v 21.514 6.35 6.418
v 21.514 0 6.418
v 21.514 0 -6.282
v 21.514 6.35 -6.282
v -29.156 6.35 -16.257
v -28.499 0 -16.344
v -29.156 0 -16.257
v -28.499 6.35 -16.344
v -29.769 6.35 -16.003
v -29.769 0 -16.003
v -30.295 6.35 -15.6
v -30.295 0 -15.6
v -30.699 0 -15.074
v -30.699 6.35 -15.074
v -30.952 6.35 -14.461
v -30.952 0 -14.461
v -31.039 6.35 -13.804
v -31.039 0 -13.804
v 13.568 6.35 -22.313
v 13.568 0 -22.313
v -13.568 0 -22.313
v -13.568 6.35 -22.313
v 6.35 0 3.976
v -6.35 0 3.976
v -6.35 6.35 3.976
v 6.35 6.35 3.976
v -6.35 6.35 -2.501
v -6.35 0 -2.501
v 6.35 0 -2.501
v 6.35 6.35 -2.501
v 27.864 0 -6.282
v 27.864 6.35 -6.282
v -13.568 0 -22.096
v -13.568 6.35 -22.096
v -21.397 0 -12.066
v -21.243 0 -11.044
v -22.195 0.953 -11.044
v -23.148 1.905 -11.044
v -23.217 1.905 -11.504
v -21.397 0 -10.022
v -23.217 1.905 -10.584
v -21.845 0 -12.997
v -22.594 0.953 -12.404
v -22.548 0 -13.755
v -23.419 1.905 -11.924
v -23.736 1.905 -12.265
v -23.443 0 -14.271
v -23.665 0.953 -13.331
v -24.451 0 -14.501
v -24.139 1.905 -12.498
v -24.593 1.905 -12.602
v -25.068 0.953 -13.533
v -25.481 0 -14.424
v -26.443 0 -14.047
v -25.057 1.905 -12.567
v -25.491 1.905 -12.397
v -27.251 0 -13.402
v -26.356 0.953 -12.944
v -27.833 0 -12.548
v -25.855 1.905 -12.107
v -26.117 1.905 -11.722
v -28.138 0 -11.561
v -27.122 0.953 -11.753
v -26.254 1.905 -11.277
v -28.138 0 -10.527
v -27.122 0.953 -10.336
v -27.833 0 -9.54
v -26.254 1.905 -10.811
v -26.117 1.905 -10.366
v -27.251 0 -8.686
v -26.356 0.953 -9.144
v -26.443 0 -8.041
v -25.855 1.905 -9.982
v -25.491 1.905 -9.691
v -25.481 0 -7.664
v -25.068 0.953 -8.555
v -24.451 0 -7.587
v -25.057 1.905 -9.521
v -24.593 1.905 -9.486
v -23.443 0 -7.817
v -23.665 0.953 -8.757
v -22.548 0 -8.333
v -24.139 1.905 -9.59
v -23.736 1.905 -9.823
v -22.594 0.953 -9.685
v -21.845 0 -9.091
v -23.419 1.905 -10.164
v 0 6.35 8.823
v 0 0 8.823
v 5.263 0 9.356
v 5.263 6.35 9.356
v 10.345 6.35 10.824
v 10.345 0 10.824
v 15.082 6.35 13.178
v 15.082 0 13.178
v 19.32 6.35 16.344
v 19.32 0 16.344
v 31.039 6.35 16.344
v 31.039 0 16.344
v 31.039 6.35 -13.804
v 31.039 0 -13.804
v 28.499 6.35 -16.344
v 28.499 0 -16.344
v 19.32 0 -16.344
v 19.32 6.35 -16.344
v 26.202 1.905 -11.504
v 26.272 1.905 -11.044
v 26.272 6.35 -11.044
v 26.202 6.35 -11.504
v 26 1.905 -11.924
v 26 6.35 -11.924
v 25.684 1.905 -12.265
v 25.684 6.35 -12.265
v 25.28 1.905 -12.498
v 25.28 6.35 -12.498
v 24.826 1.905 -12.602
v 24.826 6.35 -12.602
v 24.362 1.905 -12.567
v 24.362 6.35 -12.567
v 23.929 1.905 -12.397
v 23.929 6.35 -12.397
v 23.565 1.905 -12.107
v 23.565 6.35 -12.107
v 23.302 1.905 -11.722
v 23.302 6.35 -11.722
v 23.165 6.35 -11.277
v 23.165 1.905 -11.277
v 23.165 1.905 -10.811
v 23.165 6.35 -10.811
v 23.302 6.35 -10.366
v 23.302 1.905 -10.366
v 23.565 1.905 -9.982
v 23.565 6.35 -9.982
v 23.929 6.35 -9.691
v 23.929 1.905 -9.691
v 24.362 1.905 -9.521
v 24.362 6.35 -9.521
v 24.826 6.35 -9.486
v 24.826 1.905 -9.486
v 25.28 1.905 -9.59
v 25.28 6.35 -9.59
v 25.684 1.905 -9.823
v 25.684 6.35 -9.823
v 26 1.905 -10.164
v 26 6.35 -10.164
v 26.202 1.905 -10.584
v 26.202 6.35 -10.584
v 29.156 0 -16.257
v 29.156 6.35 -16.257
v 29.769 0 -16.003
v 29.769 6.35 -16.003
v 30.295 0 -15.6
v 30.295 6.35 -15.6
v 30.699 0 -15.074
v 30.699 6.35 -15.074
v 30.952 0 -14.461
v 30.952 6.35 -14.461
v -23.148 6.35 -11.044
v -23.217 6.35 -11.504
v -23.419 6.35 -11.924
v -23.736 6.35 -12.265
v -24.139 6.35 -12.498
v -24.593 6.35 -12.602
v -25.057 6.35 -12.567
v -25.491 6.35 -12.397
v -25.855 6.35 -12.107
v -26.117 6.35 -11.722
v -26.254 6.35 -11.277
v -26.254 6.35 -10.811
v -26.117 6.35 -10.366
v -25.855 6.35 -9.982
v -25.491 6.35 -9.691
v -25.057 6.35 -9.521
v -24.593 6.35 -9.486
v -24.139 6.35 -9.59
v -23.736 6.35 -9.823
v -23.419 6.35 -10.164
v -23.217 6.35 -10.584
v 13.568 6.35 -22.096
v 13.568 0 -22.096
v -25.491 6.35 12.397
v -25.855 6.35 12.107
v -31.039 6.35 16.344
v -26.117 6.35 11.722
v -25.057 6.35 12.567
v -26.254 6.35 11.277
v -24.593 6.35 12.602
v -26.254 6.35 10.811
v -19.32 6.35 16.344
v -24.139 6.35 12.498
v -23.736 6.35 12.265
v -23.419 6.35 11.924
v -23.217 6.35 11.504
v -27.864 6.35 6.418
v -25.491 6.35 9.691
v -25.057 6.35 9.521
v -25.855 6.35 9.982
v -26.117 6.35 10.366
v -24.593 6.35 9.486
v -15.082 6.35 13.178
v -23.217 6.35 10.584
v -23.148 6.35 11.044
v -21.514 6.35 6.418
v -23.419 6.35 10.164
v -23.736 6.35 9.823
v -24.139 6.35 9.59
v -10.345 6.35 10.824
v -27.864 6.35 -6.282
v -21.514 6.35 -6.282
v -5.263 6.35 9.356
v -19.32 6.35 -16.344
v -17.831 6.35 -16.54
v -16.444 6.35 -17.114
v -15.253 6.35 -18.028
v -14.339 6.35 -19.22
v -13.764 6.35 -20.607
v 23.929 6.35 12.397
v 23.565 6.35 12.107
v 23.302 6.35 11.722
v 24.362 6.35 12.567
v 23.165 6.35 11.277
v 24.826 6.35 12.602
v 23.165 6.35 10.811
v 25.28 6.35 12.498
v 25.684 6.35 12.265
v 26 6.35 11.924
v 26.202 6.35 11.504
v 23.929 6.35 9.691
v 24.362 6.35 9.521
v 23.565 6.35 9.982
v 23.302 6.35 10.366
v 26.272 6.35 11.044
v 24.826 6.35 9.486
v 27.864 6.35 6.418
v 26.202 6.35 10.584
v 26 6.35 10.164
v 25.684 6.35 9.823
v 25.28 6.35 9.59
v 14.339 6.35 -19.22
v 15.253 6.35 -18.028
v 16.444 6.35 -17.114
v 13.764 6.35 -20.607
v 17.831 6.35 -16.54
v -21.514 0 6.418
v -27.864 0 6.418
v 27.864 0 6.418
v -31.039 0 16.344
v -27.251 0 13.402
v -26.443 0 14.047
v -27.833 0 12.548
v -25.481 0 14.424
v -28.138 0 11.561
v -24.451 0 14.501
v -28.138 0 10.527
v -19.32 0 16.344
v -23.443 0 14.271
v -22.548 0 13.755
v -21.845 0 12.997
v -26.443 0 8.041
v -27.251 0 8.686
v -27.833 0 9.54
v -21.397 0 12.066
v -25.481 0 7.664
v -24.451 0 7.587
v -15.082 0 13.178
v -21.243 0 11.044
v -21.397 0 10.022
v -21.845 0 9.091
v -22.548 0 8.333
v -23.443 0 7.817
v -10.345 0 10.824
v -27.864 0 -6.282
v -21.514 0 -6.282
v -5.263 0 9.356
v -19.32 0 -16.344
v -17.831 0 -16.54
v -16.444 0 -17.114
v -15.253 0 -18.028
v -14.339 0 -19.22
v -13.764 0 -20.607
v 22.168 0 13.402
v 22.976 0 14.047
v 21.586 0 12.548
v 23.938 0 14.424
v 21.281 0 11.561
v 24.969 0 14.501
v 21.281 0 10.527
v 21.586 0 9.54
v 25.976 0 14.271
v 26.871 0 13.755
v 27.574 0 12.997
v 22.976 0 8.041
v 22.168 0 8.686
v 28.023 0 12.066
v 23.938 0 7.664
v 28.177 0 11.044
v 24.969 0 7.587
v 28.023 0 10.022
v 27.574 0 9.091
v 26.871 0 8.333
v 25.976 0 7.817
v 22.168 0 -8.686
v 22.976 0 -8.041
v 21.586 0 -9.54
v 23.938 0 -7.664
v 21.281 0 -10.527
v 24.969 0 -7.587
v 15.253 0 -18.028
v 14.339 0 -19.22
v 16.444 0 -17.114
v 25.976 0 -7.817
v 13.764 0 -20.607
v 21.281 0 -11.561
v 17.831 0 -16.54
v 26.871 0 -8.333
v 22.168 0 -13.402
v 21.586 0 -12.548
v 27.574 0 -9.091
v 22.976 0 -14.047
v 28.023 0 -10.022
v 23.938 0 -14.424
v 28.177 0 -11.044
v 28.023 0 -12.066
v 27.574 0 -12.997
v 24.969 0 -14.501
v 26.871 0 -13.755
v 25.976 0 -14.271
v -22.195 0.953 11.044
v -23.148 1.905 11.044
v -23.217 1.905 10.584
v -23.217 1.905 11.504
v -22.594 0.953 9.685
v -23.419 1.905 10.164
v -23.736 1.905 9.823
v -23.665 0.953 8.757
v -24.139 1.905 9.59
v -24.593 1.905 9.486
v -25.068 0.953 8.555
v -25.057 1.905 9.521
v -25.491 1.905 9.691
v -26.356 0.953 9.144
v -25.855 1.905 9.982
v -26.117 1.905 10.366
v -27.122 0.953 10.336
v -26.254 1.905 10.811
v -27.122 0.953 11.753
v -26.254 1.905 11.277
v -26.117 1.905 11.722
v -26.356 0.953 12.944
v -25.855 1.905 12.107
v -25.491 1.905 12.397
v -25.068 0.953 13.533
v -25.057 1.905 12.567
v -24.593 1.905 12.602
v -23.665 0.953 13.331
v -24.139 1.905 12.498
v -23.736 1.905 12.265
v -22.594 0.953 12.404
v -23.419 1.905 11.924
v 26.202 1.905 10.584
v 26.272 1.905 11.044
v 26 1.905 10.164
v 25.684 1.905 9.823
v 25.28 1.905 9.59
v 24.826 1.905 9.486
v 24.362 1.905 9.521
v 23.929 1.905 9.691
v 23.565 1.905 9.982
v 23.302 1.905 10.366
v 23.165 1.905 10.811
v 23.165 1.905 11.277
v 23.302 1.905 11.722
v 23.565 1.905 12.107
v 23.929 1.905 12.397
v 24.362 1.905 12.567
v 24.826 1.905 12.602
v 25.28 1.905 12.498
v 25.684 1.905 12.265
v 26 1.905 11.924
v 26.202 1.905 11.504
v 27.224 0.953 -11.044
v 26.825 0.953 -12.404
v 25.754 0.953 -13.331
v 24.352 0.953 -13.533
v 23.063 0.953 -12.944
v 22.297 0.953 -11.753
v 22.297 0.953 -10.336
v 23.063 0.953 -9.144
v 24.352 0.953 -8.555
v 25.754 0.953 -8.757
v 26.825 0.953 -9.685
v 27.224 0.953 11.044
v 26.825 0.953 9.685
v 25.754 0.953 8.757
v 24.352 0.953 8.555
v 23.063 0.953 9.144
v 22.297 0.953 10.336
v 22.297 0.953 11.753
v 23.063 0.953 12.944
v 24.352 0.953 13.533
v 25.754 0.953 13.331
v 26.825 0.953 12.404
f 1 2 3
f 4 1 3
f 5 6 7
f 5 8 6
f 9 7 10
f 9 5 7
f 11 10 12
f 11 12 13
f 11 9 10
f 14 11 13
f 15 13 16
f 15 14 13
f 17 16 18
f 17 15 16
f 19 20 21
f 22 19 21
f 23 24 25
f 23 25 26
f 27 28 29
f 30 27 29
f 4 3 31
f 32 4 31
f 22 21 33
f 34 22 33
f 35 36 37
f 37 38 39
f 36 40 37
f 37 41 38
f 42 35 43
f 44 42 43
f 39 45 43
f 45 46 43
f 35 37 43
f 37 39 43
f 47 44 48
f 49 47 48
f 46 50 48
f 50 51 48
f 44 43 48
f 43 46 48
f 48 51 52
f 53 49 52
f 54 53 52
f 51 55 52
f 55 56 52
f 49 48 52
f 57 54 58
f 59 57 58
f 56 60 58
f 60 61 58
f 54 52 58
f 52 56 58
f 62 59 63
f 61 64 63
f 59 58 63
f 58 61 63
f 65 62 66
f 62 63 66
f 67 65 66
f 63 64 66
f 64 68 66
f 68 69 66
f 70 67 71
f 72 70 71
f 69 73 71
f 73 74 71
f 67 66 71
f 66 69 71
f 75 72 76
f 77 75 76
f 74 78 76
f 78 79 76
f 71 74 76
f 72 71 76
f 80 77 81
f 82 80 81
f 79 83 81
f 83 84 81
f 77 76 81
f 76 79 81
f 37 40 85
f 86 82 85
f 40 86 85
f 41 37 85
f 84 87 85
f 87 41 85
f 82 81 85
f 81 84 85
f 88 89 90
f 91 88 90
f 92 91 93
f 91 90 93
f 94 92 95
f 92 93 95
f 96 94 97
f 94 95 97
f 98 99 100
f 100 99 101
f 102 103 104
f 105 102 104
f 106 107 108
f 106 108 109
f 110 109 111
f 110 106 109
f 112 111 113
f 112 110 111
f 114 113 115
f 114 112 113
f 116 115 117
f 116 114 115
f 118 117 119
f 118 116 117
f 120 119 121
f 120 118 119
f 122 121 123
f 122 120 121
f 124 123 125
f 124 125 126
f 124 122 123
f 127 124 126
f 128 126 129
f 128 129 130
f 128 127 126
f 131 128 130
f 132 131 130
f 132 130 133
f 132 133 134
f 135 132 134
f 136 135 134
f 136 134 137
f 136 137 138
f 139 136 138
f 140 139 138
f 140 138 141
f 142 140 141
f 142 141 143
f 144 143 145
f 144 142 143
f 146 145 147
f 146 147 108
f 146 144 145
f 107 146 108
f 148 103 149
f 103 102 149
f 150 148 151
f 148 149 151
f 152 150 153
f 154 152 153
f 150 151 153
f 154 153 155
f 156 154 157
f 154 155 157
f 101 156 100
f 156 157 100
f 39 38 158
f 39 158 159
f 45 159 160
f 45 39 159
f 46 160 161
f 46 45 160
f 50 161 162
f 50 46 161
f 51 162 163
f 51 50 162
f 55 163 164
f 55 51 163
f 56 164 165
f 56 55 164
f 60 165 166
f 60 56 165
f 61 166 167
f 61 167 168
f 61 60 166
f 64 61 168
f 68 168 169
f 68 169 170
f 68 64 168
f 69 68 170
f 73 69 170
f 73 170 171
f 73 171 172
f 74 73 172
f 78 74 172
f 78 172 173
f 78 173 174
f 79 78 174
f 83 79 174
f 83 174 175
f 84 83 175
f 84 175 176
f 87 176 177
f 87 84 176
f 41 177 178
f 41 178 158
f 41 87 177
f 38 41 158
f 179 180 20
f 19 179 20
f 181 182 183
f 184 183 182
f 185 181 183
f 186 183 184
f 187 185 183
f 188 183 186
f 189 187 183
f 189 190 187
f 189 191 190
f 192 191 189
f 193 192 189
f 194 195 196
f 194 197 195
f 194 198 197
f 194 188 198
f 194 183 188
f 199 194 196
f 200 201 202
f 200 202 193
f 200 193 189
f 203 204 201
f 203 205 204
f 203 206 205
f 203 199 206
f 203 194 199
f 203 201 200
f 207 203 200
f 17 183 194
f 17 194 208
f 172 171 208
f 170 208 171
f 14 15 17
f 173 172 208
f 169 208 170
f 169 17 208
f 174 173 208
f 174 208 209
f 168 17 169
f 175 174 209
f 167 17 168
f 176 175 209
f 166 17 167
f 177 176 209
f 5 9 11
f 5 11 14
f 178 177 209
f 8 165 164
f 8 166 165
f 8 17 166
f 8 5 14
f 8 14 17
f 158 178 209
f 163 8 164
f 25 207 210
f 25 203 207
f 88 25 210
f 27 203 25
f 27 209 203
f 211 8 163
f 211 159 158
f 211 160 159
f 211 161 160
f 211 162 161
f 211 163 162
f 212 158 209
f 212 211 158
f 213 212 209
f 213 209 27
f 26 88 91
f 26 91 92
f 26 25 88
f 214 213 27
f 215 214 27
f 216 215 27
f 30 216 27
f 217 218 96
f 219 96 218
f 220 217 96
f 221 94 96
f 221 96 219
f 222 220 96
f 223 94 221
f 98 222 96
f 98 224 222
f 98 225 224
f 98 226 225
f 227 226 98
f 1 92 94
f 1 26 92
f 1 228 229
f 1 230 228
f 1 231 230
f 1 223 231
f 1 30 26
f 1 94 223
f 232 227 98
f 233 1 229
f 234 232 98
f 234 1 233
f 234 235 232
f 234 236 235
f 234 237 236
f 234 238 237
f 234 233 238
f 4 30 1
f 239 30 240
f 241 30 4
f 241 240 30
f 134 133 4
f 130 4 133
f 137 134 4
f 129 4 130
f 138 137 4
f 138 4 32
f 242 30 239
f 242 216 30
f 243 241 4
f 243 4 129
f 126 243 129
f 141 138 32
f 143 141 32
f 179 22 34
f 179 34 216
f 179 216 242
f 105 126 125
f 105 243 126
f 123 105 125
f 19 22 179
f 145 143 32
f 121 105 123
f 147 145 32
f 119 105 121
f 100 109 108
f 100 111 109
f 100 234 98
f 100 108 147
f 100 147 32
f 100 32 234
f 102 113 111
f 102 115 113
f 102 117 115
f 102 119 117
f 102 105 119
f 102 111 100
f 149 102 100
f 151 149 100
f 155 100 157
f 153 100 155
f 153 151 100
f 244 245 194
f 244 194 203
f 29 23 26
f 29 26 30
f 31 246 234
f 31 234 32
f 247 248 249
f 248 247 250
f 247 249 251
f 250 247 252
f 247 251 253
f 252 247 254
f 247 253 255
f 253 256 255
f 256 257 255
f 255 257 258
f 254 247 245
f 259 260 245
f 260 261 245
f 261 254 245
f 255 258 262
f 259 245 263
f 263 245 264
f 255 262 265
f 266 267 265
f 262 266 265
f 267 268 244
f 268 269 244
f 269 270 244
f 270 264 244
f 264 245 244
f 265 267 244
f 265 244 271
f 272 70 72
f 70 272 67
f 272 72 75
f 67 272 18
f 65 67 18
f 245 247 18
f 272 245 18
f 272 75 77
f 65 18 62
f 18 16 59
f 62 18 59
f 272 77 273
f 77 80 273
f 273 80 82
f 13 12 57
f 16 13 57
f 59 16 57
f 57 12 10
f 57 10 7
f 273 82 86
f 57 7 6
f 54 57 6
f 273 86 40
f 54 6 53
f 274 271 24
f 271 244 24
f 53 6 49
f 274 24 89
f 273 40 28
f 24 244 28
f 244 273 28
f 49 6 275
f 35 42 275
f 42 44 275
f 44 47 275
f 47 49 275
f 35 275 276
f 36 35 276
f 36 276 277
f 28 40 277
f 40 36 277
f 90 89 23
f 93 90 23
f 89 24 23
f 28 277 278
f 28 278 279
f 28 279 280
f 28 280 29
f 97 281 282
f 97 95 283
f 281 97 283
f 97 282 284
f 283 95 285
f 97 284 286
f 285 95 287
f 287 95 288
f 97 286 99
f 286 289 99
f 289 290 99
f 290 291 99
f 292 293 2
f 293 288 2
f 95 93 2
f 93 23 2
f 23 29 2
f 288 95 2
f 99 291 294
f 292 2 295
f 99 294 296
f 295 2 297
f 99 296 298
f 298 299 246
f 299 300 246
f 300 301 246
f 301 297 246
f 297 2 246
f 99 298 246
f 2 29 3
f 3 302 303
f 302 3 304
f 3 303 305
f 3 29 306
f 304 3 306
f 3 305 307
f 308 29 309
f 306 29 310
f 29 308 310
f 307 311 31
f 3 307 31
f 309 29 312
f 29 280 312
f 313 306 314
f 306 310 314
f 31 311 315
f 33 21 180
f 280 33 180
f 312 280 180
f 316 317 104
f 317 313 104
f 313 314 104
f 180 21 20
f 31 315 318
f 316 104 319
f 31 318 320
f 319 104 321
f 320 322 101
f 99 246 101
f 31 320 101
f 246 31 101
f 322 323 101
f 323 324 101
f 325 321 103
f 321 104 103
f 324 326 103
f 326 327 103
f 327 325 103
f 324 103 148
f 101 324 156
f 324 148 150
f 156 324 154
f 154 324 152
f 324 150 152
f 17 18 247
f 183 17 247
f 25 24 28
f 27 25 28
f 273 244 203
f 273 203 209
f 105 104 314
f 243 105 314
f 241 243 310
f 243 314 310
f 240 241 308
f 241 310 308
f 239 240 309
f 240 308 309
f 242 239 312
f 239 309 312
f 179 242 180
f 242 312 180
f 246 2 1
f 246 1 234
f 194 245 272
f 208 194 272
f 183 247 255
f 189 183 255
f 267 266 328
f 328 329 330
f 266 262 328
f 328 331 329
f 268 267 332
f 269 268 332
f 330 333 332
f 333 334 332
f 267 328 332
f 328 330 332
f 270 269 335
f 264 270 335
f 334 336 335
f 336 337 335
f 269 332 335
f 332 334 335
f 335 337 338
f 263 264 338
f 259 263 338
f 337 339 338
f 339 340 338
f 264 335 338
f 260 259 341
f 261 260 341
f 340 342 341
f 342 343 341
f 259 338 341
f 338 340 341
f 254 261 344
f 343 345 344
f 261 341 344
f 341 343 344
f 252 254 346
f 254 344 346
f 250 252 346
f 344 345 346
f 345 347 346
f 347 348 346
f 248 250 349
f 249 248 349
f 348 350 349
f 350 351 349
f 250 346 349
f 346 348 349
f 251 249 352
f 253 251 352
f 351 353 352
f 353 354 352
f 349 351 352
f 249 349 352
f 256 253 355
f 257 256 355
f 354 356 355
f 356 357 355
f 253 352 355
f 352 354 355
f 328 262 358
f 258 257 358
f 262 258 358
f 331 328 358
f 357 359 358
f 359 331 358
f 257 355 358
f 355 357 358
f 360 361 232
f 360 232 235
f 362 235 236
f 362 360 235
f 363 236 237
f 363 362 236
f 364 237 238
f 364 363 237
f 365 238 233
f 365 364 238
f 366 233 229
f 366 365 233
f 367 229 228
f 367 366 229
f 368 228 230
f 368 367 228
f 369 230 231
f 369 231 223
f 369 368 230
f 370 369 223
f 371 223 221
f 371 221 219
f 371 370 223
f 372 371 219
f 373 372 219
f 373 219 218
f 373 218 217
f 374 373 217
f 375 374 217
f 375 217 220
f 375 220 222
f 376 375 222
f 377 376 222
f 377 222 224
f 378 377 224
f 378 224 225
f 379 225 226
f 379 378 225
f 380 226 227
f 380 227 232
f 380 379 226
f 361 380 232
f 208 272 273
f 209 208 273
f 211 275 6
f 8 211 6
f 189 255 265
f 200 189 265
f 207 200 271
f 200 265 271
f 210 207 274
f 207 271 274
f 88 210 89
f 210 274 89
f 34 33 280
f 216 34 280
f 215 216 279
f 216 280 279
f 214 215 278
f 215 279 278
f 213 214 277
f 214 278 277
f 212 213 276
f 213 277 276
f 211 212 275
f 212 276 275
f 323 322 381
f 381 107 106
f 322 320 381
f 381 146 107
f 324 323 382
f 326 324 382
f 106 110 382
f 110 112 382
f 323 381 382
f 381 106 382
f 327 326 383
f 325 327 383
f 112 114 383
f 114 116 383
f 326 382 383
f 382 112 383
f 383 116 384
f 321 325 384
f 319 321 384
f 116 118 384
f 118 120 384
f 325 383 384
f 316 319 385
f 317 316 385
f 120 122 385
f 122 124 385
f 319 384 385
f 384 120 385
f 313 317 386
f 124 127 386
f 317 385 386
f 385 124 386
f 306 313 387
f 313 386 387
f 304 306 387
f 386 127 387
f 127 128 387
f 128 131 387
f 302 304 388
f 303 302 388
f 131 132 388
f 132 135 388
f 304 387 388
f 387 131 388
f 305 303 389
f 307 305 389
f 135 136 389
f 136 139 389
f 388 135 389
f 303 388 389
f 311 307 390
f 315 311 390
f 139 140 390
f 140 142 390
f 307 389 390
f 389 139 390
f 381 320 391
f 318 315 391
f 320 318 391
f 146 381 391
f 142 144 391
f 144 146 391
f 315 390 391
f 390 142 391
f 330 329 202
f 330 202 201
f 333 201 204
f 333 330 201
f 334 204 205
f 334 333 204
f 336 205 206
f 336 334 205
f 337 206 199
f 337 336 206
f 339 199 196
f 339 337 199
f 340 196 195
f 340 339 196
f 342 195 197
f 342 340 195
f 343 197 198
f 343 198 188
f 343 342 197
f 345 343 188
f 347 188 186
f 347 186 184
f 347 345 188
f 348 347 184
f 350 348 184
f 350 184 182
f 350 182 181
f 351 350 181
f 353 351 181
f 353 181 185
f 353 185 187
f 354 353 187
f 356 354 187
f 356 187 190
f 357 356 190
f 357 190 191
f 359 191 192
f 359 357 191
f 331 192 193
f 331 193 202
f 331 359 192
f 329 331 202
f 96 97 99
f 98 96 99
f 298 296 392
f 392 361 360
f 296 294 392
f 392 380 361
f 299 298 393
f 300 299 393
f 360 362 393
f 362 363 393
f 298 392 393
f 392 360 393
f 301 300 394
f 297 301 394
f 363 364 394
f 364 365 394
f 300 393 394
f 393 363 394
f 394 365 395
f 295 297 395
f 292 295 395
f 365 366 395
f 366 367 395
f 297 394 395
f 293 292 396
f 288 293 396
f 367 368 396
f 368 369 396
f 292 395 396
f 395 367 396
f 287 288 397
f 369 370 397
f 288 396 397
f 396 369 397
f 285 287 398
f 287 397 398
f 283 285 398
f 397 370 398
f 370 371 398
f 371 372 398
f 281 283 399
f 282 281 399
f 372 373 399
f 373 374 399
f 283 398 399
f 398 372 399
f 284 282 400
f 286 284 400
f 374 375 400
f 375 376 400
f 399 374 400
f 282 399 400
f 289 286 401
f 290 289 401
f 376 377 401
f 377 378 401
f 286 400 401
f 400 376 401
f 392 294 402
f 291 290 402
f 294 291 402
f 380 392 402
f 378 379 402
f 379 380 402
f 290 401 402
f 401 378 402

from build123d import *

# Parameters (mm, degrees)
SKETCH1_R           = 1.5621
SKETCH1_W           = 6.35
SKETCH1_H           = 12.7
SKETCH1_W_2         = 12.7
SKETCH1_H_2         = 6.477
BOSS_EXTRUDE1_DEPTH = 6.35
FILLET1_R           = 2.54
CHAMFER1_SIZE       = 1.905


with BuildPart() as part:
    # Sketch1 → Boss-Extrude1 (new body)
    with BuildSketch(Plane(origin=(0, 0, 0), x_dir=(1, 0, 0), z_dir=(0, 1, 0))):
        with BuildLine():
            Line((13.568067648, 22.312647987), (-13.568067648, 22.312647987))
            Line((-13.568067648, 22.312647987), (-13.568067648, 22.095526842))
            ThreePointArc((-13.568067648, 22.095526842), (-15.25275396, 18.028334299), (-19.319946504, 16.343647987))
            Line((-19.319946504, 16.343647987), (-31.0388, 16.343647987))
            Line((-31.0388, 16.343647987), (-31.0388, -16.343647987))
            Line((-31.0388, -16.343647987), (-29.684698321, -16.343647987))
            Line((-29.684698321, -16.343647987), (-19.319946504, -16.343647987))
            ThreePointArc((-19.319946504, -16.343647987), (-10.344922534, -10.823696712), (0, -8.822823132))
            ThreePointArc((0, -8.822823132), (10.344922534, -10.823696712), (19.319946504, -16.343647987))
            Line((19.319946504, -16.343647987), (29.684698321, -16.343647987))
            Line((29.684698321, -16.343647987), (31.0388, -16.343647987))
            Line((31.0388, -16.343647987), (31.0388, 16.343647987))
            Line((31.0388, 16.343647987), (19.319946504, 16.343647987))
            ThreePointArc((19.319946504, 16.343647987), (15.25275396, 18.028334299), (13.568067648, 22.095526842))
            Line((13.568067648, 22.095526842), (13.568067648, 22.312647987))
        make_face()
        with Locations((-24.709647151, 11.044056729)):
            Circle(SKETCH1_R, mode=Mode.SUBTRACT)
        with Locations((-24.709647151, -11.044056729)):
            Circle(SKETCH1_R, mode=Mode.SUBTRACT)
        with Locations((24.709647151, 11.044056729)):
            Circle(SKETCH1_R, mode=Mode.SUBTRACT)
        with Locations((24.709647151, -11.044056729)):
            Circle(SKETCH1_R, mode=Mode.SUBTRACT)
        with Locations((24.6888, -0.068443271)):
            Rectangle(SKETCH1_W, SKETCH1_H, mode=Mode.SUBTRACT)
        with Locations((-24.6888, -0.068443271)):
            Rectangle(SKETCH1_W, SKETCH1_H, mode=Mode.SUBTRACT)
        with Locations((0, -0.737852013)):
            Rectangle(SKETCH1_W_2, SKETCH1_H_2, mode=Mode.SUBTRACT)
    extrude(amount=BOSS_EXTRUDE1_DEPTH)

    # Fillet1
    fillet1_edges = [part.edges().sort_by_distance(p)[0] for p in [
        (-31.0388, 3.175, -16.343647987),
        (31.0388, 3.175, -16.343647987),
    ]]
    fillet(fillet1_edges, radius=FILLET1_R)

    # Chamfer1
    chamfer1_edges = [part.edges().sort_by_distance(p)[0] for p in [
        (-26.271747151, 0, -11.044056729),
        (-26.271747151, 0, 11.044056729),
        (23.147547151, 0, -11.044056729),
        (23.147547151, 0, 11.044056729),
    ]]
    chamfer(chamfer1_edges, length=CHAMFER1_SIZE)


solid = part.part
